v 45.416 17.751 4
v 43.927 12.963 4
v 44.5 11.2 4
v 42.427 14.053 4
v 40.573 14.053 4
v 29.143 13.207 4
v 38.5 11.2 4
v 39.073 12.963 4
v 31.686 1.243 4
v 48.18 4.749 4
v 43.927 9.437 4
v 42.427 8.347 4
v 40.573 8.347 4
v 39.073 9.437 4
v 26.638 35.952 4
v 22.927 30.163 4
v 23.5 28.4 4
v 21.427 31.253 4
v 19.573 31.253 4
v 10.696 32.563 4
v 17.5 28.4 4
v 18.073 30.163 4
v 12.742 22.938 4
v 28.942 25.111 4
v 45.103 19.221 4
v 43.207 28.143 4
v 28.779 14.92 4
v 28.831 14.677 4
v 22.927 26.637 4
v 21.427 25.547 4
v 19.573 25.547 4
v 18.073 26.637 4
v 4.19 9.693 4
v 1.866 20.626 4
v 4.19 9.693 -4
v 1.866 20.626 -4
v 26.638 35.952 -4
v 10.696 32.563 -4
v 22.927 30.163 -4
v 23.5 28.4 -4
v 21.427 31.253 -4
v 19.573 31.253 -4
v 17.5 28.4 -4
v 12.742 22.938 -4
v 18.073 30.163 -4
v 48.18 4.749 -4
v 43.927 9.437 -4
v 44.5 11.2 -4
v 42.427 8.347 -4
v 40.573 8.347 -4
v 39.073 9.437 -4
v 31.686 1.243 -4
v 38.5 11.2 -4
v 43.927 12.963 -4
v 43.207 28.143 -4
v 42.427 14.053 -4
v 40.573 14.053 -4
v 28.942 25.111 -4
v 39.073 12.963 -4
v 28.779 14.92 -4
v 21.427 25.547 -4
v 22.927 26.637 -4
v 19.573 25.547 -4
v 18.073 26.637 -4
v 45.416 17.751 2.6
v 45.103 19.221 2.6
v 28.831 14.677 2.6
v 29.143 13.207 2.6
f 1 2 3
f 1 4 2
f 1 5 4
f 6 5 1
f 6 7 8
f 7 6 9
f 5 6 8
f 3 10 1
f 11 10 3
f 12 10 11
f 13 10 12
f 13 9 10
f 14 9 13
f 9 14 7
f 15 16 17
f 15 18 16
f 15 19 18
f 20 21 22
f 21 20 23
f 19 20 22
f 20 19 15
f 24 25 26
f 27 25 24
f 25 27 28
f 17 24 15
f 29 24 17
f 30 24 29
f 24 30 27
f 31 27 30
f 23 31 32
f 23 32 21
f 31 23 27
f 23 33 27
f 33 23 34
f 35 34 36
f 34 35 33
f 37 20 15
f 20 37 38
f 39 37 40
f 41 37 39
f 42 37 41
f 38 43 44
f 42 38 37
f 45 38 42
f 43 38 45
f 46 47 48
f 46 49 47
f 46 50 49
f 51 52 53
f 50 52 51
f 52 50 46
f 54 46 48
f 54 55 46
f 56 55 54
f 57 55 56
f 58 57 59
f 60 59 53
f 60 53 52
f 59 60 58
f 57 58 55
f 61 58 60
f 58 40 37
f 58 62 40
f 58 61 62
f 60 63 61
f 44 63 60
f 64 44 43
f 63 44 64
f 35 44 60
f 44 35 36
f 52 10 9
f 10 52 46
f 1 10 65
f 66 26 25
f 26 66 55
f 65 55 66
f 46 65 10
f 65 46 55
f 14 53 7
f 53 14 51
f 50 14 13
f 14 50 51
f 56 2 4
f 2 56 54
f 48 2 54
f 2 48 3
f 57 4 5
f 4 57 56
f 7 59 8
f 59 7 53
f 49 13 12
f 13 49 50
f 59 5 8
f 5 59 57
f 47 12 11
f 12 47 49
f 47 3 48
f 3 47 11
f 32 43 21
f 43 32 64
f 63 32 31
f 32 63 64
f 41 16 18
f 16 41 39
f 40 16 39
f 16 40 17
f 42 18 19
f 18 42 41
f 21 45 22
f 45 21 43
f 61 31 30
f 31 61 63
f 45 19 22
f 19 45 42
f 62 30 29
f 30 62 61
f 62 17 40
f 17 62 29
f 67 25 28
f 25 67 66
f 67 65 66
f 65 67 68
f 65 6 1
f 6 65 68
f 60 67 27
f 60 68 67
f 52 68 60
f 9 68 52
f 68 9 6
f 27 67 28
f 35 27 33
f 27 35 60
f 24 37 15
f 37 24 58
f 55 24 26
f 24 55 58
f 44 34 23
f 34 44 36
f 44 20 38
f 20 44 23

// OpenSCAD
//
// Block to hold tubing and modulate liquid flow
// 

module rotary()
{
	module hole(r, h) {
		rotate([0,0,0])
			cylinder(r=r, h=h,center=true);
	}

	difference() {
	// BODY (to be subtracted from)
	 translate([long,width/2,0])
	  rotate([0,0,alpha])
	   cube([length,width,thick],center=true);

	// MOUNTING HOLES
	 translate([long+width/2,2*offset,0])
	   hole(hradius, thickplus);

   translate([medium+width/2, width-offset-1, 0])
	   hole( hradius, thickplus);

	// WIRE TROUGH
	 translate([long+4,2+width/3,thickplus/2-dia])
	   rotate([0,0,1.3*alpha])
            cube([2*length,dia, dia+0.3],center=true);

	// CORNER CUT-OUT
	 translate([long-width/5,3,0])
	  rotate([0,0,alpha])
	   cube([length/1.5,width/1.9,thickplus],center=true);

	 translate([long+14,width-2,0])
	  rotate([0,0,alpha])
	   cube([length/2,width/3,thickplus],center=true);

	 translate([medium+3,width-8,0])
	  rotate([0,0,alpha])
	   cube([1+length/4,2+width/4,thickplus],center=true);
}

	alpha  = 12; // Angle between radials in degrees

	length = 42; // mm   Main Block
	width  = 35; // mm
	thick = 8;  // 8mm

	thickplus = thick + 2;  // plus margin

	long   = 24; // mm  // Distances from center
	medium = 3; // mm
//	long   = 154; // mm  // Distances from center
//	medium = 133; // mm
	short  = 120; // mm

	hradius = 3;    // mounting hole radius mm
	dia     = 1.5;  // wire trough mm
	offset  = 5.6;  // distance from edge to mounting hole
}

rotary();
